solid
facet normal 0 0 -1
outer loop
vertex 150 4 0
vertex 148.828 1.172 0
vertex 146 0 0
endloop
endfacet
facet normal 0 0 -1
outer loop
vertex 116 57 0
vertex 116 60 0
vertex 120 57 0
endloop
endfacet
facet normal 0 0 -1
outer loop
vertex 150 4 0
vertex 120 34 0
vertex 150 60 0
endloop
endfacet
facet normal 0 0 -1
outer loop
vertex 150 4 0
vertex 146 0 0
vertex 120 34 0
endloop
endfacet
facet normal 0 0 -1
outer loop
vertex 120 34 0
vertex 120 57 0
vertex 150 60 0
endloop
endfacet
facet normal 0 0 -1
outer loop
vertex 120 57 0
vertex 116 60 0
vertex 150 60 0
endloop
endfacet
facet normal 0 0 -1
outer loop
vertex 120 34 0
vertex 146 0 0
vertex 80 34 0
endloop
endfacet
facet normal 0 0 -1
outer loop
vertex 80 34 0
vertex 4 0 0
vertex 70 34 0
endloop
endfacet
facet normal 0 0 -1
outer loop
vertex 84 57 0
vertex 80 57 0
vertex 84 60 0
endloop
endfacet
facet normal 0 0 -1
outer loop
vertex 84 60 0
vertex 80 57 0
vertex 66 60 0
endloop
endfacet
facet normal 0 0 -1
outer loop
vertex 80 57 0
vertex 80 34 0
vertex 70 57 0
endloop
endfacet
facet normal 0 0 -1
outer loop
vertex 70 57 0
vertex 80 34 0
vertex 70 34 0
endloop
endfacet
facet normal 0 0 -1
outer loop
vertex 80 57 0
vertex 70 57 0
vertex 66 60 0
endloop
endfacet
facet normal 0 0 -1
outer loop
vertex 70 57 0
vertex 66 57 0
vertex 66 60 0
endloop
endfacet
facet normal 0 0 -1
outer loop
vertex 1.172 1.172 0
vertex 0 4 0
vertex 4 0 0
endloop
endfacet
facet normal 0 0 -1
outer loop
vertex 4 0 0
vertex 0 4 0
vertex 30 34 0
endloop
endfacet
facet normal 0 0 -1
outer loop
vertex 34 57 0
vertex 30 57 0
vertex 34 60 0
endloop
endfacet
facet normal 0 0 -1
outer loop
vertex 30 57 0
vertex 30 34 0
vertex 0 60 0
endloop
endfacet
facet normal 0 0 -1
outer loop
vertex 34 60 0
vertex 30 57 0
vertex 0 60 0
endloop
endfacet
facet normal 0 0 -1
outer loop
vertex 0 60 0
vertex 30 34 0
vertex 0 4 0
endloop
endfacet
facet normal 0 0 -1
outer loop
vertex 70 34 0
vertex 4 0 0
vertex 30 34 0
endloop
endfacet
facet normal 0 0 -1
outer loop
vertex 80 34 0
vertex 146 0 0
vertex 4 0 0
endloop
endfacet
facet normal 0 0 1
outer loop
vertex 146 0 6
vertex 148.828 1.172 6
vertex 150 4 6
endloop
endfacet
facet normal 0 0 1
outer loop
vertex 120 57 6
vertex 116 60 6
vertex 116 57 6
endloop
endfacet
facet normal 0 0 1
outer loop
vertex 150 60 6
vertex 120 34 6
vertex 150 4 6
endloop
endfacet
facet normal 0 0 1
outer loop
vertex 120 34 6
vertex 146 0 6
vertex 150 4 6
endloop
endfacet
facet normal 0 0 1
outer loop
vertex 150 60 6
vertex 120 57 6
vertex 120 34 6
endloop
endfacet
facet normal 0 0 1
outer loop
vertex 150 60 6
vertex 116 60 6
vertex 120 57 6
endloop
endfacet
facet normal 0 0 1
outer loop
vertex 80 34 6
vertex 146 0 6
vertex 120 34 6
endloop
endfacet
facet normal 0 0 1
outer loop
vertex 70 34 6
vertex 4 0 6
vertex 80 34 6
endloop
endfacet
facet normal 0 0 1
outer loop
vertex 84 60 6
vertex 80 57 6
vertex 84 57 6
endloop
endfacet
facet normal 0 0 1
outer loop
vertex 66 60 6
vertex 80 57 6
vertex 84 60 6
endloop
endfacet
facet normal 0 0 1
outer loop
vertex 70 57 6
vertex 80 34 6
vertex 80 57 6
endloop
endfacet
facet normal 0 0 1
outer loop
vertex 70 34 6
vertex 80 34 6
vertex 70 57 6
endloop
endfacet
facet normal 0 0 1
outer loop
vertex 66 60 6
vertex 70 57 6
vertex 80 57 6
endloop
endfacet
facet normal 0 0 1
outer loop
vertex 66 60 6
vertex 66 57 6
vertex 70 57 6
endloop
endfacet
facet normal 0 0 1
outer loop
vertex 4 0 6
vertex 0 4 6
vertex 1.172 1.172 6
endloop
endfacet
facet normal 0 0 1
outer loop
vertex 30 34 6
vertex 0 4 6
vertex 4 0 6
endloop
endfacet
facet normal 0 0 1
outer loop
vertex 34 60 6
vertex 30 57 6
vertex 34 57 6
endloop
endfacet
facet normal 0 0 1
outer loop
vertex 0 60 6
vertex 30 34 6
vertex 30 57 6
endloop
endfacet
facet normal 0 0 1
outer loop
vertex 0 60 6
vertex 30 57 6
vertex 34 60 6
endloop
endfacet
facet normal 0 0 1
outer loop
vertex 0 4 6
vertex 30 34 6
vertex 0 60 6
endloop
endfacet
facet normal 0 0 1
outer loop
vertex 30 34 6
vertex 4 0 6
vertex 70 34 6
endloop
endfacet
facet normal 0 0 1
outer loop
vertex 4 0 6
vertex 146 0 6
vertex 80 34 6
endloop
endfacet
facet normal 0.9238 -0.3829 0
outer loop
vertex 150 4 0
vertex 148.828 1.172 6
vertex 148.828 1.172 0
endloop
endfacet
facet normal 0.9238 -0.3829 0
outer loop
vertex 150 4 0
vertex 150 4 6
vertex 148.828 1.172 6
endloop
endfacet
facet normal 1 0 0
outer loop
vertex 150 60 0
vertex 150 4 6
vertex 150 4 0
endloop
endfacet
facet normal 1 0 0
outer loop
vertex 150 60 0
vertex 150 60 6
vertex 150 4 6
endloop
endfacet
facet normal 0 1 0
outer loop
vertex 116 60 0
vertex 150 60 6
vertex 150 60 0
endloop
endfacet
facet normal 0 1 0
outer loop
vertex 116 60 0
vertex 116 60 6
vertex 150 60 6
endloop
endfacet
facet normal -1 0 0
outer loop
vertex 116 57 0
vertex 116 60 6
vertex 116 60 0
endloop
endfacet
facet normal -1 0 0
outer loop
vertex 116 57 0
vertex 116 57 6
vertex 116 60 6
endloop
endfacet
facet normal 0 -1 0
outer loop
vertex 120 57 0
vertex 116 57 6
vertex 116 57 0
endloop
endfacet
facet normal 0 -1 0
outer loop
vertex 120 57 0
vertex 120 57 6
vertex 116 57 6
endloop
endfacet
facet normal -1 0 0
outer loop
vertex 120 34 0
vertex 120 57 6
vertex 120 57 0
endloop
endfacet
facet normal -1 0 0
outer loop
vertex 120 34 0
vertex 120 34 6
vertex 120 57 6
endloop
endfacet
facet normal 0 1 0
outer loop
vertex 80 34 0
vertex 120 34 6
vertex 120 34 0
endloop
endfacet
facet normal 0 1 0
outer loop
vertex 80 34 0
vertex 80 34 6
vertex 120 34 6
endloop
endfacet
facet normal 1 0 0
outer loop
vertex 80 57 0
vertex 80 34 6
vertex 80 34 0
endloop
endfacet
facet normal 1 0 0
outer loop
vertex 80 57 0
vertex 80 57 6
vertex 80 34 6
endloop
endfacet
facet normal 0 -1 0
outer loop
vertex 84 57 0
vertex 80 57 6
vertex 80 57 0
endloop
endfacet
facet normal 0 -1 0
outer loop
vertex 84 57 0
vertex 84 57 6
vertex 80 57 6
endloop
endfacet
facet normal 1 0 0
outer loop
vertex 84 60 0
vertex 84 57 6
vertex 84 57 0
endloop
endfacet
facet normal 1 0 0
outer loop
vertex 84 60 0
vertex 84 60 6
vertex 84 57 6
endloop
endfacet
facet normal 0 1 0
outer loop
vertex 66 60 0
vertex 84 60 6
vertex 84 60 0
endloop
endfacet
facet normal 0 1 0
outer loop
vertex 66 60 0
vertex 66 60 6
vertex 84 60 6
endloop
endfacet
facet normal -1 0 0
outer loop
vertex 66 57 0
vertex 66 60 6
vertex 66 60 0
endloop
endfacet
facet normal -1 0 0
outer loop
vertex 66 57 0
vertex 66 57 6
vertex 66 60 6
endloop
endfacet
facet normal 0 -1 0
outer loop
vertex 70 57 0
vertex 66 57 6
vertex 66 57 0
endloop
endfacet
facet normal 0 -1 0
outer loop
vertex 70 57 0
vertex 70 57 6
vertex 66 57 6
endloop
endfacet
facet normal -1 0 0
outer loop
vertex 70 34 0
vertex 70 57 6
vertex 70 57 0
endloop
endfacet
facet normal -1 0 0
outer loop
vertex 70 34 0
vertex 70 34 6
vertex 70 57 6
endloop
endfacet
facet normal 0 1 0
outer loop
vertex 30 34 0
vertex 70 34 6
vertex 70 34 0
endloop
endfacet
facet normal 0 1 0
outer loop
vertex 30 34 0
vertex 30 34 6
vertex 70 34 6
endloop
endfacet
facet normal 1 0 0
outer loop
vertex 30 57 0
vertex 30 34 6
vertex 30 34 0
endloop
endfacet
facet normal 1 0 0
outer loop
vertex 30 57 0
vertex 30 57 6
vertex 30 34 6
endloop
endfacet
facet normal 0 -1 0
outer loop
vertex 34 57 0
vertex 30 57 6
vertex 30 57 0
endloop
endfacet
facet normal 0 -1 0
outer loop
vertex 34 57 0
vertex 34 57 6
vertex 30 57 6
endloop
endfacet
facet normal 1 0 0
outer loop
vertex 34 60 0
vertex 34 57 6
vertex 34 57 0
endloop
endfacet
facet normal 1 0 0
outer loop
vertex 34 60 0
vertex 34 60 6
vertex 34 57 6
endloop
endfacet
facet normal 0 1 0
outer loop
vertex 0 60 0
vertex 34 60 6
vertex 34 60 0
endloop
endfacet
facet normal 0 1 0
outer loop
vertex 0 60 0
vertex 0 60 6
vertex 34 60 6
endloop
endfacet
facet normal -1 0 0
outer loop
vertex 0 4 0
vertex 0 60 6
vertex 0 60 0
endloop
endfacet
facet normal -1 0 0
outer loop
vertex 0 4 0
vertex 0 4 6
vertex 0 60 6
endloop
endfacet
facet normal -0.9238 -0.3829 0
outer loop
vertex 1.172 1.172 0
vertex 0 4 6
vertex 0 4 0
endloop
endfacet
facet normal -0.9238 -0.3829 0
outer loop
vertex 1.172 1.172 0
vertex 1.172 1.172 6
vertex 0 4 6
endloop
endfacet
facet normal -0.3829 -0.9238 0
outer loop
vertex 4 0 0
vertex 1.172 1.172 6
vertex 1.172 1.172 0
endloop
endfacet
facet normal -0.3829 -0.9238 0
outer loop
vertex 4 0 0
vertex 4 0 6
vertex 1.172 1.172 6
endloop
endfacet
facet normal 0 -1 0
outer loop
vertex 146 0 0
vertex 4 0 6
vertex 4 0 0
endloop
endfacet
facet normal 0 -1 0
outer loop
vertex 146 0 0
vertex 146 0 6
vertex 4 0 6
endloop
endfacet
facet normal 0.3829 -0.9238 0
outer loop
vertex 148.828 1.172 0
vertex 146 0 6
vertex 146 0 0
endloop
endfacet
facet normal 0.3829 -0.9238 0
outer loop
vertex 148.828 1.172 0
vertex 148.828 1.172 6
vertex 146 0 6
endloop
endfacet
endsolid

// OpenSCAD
$fn = 32;

// ----------------------------------------------------------------------
// Oversize slot bar: 150 mm bar with 2 oversize windows
// ----------------------------------------------------------------------

// --- parameters (mm) ---
profile_height = 6;       // extrusion height
profile_points = 24;      // points of the closed outline

profile = [[0, 4], [1.172, 1.172], [4, 0], [146, 0], [148.828, 1.172], [150, 4], [150, 60], [116, 60], [116, 57], [120, 57], [120, 34], [80, 34], [80, 57], [84, 57], [84, 60], [66, 60], [66, 57], [70, 57], [70, 34], [30, 34], [30, 57], [34, 57], [34, 60], [0, 60]];  // single closed polygon, 24 points, counter clockwise

// --- the one profile operation ---
linear_extrude(height = profile_height) polygon(points = profile);
